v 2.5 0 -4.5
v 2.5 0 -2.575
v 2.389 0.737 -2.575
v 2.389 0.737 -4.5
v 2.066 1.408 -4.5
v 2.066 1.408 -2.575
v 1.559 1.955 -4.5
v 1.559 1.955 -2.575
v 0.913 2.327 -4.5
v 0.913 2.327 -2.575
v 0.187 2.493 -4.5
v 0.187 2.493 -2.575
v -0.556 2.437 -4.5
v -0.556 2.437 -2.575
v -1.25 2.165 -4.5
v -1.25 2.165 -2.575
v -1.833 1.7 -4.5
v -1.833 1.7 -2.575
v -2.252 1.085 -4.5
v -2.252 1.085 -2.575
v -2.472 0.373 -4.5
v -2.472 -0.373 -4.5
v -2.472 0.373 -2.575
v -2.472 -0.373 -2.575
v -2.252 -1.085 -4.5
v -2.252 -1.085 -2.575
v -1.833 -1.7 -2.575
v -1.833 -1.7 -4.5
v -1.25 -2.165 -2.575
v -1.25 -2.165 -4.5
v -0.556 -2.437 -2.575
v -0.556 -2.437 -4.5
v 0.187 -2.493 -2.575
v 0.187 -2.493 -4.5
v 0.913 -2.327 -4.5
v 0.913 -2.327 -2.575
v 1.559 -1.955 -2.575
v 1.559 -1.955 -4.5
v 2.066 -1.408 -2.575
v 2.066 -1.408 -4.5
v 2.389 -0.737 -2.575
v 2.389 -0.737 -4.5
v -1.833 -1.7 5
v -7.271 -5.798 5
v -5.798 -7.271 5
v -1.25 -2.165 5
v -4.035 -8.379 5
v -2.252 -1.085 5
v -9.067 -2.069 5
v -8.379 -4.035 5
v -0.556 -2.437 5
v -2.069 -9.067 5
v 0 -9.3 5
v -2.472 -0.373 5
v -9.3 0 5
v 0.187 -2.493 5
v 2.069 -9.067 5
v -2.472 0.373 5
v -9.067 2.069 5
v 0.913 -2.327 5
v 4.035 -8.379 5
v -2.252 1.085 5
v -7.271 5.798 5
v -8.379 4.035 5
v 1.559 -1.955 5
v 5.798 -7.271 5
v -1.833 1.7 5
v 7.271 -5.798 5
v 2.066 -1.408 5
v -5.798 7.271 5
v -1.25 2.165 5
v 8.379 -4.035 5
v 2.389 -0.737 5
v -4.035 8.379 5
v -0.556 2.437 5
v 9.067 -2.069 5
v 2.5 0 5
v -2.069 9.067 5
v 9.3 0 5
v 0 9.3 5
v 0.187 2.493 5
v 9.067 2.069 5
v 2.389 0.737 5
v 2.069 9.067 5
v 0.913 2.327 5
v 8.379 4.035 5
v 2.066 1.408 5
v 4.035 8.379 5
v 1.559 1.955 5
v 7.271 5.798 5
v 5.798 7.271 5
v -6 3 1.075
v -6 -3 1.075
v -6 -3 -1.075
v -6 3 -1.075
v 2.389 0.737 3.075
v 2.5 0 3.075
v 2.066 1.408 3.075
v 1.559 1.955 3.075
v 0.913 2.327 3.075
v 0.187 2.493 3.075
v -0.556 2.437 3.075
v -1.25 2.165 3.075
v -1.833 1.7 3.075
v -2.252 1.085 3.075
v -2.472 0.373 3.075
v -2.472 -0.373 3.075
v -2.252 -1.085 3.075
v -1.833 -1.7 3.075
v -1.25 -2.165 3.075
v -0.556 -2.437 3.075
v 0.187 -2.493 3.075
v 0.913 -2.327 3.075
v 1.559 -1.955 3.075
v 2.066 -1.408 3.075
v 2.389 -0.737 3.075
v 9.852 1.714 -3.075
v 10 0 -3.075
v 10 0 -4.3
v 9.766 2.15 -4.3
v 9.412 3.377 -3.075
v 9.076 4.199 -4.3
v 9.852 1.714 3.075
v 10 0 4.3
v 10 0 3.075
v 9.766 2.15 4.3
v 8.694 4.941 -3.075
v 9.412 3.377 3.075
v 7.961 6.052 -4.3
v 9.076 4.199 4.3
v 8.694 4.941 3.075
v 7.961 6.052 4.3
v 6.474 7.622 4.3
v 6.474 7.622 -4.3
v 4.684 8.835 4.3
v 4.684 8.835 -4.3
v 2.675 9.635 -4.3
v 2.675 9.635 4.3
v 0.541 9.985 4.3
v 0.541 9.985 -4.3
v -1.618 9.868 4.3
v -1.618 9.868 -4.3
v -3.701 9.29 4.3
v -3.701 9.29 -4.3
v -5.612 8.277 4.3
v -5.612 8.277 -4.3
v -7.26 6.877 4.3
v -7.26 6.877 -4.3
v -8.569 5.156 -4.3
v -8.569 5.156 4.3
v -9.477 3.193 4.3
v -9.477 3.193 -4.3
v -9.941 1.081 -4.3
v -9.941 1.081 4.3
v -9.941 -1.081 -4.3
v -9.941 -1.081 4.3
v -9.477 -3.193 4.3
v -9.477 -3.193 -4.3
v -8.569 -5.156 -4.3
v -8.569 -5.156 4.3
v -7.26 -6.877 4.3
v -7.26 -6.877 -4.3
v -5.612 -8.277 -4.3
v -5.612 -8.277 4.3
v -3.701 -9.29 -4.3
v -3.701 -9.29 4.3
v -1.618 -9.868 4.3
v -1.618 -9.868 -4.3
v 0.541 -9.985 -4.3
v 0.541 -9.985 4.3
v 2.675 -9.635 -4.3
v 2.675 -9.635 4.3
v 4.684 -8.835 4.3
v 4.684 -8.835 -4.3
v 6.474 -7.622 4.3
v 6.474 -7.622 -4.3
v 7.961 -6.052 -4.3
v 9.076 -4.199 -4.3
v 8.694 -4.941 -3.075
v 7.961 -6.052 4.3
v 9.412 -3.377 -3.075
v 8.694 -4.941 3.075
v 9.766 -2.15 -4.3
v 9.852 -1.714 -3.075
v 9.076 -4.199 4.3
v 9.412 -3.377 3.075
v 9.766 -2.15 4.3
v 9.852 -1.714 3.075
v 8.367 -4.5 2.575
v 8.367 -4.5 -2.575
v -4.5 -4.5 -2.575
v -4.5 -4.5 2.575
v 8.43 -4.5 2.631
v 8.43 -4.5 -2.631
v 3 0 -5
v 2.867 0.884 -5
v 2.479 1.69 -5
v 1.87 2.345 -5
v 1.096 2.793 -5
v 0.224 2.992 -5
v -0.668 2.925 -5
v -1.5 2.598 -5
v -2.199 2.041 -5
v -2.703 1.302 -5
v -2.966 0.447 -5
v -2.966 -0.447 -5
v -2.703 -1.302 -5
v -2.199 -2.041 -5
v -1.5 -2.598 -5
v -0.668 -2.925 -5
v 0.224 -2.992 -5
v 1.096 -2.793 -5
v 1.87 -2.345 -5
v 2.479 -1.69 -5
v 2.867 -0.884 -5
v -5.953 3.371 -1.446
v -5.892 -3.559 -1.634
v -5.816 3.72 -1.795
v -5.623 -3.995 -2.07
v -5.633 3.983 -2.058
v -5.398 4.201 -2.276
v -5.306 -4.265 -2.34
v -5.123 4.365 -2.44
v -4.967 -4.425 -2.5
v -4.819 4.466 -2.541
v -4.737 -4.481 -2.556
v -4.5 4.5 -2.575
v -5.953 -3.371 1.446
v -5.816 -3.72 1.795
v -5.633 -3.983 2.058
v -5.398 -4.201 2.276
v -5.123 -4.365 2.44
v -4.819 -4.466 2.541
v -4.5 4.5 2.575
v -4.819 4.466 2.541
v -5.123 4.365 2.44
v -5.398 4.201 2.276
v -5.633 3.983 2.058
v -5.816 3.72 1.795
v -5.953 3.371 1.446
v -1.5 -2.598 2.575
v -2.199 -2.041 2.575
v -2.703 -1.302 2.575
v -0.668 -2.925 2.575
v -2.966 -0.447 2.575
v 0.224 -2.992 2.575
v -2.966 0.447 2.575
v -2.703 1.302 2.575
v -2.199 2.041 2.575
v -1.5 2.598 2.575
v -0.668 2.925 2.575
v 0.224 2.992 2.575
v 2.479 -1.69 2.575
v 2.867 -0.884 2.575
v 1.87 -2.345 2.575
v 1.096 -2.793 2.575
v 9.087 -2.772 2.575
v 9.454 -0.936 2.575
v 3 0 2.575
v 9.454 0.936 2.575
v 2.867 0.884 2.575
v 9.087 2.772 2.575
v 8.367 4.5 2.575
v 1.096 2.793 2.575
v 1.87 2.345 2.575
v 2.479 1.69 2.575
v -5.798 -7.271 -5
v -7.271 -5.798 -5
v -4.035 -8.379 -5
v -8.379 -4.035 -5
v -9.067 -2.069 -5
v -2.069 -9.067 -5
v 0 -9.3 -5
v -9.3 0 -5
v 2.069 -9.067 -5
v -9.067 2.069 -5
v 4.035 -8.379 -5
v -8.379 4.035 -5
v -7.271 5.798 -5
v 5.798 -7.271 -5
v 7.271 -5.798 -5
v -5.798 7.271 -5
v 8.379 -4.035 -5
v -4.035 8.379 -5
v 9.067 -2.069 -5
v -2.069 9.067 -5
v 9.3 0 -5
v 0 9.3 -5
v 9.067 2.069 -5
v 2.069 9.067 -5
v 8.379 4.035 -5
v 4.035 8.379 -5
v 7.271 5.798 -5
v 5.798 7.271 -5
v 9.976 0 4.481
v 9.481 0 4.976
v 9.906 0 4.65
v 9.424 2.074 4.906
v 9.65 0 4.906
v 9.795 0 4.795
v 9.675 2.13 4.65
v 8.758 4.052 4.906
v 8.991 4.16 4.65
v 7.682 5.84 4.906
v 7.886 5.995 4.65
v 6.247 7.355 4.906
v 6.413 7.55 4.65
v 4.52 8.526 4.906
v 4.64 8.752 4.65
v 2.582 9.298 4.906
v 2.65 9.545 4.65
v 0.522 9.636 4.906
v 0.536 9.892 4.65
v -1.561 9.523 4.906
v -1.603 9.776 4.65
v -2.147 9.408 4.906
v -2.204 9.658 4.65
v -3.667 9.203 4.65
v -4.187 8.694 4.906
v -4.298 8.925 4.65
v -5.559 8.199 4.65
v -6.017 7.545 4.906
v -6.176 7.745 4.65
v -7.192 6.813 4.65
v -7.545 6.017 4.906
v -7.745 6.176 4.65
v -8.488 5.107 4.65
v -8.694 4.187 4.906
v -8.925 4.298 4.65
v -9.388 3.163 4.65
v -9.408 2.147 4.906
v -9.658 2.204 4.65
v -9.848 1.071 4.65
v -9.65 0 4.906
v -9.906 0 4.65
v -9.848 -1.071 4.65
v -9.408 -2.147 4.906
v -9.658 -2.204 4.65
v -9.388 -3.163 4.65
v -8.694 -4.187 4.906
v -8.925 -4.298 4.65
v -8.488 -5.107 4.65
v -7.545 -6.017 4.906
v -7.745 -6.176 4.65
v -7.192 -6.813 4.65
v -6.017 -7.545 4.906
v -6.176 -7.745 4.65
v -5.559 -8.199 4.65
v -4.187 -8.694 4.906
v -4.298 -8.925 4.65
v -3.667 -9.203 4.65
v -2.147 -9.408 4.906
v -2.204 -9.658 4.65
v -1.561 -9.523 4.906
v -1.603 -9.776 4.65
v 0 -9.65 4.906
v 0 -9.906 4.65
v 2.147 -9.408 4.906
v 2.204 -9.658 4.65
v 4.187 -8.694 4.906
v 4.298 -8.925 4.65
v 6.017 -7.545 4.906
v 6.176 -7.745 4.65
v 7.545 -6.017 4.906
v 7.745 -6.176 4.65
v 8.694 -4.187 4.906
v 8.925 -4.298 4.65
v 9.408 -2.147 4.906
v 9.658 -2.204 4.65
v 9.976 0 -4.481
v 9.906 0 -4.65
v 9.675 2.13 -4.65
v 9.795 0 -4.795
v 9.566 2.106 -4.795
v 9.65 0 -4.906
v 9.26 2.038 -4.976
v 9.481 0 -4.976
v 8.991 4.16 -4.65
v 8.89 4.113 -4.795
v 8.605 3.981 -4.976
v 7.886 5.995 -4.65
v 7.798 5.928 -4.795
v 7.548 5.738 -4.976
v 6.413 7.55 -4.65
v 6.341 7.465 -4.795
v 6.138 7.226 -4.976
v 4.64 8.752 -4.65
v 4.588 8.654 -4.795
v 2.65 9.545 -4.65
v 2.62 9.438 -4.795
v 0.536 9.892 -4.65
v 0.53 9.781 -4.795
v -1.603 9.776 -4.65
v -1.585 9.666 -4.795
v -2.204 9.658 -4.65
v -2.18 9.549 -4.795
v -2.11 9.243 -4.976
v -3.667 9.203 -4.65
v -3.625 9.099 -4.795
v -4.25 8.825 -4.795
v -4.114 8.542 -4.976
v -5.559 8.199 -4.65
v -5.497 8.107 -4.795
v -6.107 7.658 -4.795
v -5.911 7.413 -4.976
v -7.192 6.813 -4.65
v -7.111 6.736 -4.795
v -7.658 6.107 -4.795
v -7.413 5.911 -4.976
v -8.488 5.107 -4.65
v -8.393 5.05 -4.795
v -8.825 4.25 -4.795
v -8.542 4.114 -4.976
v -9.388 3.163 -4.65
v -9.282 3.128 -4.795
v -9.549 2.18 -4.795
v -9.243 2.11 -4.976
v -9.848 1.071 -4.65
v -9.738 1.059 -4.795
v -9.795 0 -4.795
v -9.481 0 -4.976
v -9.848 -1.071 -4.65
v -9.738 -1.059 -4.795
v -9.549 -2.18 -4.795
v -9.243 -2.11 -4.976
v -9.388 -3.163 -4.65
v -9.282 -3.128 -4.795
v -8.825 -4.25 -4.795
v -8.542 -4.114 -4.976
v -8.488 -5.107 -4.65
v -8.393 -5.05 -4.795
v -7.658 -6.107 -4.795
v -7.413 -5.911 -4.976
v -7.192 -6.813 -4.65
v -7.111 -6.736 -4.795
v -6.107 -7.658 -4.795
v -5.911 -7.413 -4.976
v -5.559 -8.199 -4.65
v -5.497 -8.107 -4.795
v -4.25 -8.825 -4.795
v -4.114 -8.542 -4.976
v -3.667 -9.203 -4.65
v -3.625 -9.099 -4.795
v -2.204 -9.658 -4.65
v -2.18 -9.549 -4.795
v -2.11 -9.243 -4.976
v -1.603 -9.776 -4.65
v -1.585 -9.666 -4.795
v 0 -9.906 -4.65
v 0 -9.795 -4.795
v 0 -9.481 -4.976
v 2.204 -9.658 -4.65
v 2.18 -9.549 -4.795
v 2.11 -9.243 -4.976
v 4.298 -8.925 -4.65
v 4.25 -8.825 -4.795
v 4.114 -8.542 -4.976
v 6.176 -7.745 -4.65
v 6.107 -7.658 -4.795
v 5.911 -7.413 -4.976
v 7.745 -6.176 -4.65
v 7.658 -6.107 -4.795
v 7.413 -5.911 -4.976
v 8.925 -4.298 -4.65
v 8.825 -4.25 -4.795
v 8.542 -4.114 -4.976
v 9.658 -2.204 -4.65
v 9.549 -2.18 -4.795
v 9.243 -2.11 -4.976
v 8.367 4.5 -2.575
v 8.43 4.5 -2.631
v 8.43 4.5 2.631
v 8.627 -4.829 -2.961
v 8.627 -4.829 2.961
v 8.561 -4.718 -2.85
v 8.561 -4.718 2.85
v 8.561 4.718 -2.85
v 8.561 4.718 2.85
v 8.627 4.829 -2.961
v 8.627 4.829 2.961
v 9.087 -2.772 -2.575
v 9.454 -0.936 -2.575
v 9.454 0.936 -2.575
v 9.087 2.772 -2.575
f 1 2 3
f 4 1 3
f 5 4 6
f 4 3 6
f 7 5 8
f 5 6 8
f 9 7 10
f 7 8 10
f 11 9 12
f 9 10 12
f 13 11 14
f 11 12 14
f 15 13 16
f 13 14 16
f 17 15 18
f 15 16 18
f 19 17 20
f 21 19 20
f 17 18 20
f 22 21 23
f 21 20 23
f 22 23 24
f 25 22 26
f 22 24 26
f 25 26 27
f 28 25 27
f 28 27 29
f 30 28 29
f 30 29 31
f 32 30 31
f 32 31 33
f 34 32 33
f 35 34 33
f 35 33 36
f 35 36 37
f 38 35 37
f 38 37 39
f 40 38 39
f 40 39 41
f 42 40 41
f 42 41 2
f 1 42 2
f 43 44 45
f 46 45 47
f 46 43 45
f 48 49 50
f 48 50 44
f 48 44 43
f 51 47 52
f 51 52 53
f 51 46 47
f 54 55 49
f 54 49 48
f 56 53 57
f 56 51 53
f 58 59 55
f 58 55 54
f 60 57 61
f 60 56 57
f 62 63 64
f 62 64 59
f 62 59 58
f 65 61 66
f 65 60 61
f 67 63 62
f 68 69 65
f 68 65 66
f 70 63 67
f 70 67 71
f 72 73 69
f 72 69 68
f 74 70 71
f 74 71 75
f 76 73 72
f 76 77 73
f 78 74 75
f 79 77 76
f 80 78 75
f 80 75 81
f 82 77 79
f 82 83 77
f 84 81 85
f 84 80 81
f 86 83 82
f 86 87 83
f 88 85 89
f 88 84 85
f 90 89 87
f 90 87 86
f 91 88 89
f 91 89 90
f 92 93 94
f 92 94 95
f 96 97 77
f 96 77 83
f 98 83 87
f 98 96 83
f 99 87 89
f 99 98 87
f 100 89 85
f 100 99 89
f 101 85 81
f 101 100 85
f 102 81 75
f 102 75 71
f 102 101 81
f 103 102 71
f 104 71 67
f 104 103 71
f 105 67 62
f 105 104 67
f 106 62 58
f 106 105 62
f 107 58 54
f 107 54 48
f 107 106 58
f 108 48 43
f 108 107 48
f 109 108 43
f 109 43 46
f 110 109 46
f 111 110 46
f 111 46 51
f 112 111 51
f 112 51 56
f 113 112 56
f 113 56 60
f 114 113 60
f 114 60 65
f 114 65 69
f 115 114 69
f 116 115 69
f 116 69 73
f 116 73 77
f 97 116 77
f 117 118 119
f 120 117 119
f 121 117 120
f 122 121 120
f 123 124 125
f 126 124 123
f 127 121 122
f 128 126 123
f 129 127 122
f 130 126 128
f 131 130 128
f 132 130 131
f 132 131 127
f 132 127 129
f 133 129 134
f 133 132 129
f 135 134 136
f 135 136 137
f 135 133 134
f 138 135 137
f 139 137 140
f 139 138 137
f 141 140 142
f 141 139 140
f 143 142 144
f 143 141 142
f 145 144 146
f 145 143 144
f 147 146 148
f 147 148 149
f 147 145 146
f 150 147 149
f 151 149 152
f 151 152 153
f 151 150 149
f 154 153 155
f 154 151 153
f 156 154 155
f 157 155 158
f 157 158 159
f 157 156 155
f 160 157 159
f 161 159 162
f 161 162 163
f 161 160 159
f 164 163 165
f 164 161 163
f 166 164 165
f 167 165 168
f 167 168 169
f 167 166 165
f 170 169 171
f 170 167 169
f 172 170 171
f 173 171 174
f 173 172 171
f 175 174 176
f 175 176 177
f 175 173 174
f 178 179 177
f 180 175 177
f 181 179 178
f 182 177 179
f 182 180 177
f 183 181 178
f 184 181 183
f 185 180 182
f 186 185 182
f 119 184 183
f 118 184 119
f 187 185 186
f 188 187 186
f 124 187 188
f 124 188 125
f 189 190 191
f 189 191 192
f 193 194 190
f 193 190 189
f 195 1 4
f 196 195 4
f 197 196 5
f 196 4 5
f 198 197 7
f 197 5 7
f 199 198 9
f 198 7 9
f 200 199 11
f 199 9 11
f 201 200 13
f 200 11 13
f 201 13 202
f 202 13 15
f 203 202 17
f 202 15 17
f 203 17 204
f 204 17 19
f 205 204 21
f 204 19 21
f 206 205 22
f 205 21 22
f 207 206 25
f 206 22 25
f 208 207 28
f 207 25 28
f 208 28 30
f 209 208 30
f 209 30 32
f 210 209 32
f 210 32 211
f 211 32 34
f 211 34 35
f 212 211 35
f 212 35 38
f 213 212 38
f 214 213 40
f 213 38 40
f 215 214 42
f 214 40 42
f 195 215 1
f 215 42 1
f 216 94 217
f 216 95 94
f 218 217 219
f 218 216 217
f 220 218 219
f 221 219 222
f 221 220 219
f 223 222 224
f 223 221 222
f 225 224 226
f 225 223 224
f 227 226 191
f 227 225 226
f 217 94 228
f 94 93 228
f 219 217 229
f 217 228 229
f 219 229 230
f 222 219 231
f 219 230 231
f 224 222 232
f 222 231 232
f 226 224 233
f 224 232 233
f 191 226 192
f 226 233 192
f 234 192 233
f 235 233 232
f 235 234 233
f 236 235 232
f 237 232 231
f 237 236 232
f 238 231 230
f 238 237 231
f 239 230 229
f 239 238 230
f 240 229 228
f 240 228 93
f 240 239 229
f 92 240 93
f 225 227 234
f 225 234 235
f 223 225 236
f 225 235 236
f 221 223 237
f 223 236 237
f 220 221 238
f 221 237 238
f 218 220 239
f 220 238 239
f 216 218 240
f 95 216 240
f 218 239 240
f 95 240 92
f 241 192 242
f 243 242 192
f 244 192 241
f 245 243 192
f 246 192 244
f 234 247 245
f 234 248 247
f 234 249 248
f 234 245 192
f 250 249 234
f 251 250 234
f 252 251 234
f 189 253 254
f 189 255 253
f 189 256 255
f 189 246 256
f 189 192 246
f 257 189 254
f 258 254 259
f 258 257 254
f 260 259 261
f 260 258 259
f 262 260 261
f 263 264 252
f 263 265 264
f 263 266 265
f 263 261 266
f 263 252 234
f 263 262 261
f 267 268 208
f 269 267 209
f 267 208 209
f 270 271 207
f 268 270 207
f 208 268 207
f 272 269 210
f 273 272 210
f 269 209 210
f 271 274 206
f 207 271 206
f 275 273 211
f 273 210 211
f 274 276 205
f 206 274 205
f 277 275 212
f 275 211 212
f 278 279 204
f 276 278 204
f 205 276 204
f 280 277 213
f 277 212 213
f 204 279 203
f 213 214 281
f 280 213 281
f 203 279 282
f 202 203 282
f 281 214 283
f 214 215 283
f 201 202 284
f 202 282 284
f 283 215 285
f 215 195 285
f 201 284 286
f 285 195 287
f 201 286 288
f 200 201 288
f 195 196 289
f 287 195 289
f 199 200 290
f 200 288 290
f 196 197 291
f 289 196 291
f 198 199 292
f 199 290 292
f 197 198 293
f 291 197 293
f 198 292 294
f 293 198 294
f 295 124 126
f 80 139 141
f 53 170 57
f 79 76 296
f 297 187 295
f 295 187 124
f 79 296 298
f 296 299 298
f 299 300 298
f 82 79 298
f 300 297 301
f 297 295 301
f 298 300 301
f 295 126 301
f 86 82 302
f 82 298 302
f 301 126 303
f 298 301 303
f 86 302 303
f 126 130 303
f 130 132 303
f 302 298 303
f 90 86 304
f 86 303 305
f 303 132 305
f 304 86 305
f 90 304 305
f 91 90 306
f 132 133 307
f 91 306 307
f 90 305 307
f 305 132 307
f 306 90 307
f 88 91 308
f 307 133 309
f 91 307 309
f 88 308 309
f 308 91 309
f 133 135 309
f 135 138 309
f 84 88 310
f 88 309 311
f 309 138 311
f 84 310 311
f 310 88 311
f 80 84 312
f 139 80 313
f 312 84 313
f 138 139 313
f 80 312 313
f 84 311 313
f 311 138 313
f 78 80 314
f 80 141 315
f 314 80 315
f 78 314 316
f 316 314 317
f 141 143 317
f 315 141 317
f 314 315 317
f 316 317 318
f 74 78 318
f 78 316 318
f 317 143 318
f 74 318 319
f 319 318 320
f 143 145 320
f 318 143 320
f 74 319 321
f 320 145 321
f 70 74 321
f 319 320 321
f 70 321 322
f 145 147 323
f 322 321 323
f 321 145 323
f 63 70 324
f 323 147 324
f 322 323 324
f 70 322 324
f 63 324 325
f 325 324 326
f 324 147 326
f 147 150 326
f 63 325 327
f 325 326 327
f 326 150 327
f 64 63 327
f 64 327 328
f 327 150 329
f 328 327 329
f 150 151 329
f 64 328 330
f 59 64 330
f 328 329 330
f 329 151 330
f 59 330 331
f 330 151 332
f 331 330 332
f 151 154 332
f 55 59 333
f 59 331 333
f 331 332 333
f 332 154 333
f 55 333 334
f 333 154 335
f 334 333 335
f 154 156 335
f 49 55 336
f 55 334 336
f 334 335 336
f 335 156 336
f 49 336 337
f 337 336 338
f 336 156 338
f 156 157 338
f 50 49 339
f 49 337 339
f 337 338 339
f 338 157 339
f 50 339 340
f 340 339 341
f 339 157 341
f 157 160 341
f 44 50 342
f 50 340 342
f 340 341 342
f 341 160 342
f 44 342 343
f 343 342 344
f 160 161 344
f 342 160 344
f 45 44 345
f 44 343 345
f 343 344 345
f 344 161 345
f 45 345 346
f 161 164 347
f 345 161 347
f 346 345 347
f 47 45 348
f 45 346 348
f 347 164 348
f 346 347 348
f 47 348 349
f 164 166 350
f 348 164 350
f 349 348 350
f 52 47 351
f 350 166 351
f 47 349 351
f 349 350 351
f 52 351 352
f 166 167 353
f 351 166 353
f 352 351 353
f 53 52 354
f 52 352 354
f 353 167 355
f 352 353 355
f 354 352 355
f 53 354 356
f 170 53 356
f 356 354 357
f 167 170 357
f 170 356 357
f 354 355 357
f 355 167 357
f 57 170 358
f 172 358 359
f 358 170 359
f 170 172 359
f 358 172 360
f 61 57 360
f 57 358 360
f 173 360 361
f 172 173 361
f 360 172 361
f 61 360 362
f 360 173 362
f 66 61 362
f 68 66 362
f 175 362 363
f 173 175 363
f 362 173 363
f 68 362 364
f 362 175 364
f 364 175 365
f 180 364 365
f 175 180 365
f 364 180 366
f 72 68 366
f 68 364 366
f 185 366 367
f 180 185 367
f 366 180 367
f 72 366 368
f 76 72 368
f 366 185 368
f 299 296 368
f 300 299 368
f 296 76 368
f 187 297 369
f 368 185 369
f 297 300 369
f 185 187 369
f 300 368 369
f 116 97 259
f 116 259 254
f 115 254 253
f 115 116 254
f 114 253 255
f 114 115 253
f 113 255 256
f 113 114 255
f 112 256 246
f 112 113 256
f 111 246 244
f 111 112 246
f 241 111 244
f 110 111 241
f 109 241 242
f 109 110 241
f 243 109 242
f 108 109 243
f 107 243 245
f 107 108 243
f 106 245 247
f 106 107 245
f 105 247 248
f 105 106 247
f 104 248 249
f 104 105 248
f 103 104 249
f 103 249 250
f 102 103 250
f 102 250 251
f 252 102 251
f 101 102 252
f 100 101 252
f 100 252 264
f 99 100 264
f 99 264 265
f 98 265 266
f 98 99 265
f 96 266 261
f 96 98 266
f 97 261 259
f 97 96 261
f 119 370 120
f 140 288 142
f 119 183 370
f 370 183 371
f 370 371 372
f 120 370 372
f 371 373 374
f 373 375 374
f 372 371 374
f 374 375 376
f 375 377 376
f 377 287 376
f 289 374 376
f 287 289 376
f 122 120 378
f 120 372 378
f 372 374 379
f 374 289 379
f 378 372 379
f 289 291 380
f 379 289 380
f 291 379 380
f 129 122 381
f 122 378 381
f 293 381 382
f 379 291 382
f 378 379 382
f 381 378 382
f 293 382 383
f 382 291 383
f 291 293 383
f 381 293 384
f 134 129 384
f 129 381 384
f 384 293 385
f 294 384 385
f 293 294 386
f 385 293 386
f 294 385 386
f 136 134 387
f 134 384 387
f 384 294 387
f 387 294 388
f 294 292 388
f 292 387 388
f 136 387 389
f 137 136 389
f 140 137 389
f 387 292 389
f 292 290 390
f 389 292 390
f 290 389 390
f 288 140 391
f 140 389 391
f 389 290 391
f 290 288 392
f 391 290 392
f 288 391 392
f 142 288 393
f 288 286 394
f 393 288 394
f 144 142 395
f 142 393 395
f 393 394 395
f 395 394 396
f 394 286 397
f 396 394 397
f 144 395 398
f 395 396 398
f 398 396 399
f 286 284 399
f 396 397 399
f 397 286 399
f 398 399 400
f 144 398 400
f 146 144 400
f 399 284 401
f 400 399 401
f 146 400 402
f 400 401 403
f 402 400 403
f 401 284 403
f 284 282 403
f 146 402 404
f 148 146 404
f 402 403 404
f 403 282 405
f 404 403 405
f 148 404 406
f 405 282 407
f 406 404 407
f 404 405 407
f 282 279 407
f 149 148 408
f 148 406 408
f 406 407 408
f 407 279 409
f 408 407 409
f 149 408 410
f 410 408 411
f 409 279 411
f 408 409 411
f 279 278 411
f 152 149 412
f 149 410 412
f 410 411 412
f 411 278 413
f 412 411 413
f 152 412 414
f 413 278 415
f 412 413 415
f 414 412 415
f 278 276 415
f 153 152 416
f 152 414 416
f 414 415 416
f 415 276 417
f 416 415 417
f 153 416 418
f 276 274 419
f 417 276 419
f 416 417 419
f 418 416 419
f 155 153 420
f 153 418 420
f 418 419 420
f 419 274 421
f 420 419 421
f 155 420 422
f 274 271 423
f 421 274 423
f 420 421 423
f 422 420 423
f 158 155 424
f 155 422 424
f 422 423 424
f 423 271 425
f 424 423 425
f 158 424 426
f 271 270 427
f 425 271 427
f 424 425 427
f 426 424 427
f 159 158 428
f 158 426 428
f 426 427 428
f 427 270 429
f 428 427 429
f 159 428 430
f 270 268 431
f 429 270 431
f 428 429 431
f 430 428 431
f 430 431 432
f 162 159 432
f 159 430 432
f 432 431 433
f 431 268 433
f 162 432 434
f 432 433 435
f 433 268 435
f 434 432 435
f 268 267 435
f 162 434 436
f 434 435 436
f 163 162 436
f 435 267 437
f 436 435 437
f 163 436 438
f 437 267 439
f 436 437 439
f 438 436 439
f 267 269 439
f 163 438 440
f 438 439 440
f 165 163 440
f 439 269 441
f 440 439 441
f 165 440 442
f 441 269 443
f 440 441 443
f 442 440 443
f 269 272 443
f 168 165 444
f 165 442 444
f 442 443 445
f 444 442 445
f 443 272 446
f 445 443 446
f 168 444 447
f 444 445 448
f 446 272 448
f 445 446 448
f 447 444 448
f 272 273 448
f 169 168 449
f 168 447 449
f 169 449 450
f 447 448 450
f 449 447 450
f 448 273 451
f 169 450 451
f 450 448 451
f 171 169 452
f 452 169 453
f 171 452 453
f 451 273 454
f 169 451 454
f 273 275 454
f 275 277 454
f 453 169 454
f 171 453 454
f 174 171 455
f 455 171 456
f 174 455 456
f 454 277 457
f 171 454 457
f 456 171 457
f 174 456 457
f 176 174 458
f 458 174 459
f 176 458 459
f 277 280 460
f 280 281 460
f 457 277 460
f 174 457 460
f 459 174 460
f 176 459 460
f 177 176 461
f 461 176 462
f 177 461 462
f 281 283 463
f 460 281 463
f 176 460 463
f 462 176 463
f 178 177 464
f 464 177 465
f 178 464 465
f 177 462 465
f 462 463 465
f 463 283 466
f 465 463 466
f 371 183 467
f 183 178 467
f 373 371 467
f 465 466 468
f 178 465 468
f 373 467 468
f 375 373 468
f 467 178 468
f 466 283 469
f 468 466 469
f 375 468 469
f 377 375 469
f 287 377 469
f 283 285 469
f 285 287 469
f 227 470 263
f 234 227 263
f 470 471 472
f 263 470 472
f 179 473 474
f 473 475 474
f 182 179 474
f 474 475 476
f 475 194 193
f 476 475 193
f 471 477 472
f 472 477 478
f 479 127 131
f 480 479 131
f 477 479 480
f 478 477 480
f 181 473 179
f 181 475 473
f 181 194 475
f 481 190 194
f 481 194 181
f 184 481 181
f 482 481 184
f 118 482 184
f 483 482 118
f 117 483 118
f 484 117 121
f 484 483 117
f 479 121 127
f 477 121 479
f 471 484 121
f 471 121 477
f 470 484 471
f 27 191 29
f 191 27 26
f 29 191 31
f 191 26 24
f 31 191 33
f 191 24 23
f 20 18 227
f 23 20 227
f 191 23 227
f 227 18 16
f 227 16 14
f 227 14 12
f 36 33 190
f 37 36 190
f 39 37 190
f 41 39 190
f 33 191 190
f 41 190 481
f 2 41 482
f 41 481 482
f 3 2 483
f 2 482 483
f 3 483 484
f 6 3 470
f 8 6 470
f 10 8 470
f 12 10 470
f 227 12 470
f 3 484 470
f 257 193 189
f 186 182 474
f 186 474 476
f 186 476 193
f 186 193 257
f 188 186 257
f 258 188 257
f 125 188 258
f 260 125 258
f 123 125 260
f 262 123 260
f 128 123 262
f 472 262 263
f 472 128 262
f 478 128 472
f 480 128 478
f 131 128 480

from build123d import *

# Parameters (mm, degrees)
SKETCH_R        = 10
SKETCH_R_2      = 2.5
PAD_DEPTH       = 5
PAD_DEPTH_BACK  = 5
SKETCH001_W     = 9
SKETCH001_H     = 5.15
POCKET_DEPTH    = 16
CHAMFER_SIZE    = 0.5
FILLET_R        = 1.5
CHAMFER001_SIZE = 0.5
FILLET001_R     = 0.7


with BuildPart() as part:
    # Sketch → Pad (new body, two sides)
    with BuildSketch(Plane.XY) as pad_sk:
        Circle(SKETCH_R)
        Circle(SKETCH_R_2, mode=Mode.SUBTRACT)
    extrude(amount=PAD_DEPTH)
    extrude(pad_sk.sketch, amount=-PAD_DEPTH_BACK)

    # Sketch001 (on DatumPlane) → Pocket (cut)
    with BuildSketch(Plane.YZ.offset(10)):
        Rectangle(SKETCH001_W, SKETCH001_H)
    extrude(amount=-POCKET_DEPTH, mode=Mode.SUBTRACT)

    # Chamfer
    chamfer_edges = [part.edges().sort_by_distance(p)[0] for p in [
        (-2.5, 0, -5),
        (-2.5, 0, 2.575),
    ]]
    chamfer(chamfer_edges, length=CHAMFER_SIZE)

    # Fillet
    fillet_edges = [part.edges().sort_by_distance(p)[0] for p in [
        (-6, 0, 2.575),
        (-6, 4.5, 0),
        (-6, 0, -2.575),
        (-6, -4.5, 0),
    ]]
    fillet(fillet_edges, radius=FILLET_R)

    # Chamfer001
    chamfer001_edges = [part.edges().sort_by_distance(p)[0] for p in [
        (9.728897, -2.312698, -2.575),
        (8.930286, -4.5, 0),
        (9.728897, -2.312698, 2.575),
        (9.728897, 2.312698, 2.575),
        (8.930286, 4.5, 0),
        (9.728897, 2.312698, -2.575),
    ]]
    chamfer(chamfer001_edges, length=CHAMFER001_SIZE)

    # Fillet001
    fillet001_edges = [part.edges().sort_by_distance(p)[0] for p in [
        (-10, 0, 5),
        (-10, 0, -5),
    ]]
    fillet(fillet001_edges, radius=FILLET001_R)


solid = part.part
